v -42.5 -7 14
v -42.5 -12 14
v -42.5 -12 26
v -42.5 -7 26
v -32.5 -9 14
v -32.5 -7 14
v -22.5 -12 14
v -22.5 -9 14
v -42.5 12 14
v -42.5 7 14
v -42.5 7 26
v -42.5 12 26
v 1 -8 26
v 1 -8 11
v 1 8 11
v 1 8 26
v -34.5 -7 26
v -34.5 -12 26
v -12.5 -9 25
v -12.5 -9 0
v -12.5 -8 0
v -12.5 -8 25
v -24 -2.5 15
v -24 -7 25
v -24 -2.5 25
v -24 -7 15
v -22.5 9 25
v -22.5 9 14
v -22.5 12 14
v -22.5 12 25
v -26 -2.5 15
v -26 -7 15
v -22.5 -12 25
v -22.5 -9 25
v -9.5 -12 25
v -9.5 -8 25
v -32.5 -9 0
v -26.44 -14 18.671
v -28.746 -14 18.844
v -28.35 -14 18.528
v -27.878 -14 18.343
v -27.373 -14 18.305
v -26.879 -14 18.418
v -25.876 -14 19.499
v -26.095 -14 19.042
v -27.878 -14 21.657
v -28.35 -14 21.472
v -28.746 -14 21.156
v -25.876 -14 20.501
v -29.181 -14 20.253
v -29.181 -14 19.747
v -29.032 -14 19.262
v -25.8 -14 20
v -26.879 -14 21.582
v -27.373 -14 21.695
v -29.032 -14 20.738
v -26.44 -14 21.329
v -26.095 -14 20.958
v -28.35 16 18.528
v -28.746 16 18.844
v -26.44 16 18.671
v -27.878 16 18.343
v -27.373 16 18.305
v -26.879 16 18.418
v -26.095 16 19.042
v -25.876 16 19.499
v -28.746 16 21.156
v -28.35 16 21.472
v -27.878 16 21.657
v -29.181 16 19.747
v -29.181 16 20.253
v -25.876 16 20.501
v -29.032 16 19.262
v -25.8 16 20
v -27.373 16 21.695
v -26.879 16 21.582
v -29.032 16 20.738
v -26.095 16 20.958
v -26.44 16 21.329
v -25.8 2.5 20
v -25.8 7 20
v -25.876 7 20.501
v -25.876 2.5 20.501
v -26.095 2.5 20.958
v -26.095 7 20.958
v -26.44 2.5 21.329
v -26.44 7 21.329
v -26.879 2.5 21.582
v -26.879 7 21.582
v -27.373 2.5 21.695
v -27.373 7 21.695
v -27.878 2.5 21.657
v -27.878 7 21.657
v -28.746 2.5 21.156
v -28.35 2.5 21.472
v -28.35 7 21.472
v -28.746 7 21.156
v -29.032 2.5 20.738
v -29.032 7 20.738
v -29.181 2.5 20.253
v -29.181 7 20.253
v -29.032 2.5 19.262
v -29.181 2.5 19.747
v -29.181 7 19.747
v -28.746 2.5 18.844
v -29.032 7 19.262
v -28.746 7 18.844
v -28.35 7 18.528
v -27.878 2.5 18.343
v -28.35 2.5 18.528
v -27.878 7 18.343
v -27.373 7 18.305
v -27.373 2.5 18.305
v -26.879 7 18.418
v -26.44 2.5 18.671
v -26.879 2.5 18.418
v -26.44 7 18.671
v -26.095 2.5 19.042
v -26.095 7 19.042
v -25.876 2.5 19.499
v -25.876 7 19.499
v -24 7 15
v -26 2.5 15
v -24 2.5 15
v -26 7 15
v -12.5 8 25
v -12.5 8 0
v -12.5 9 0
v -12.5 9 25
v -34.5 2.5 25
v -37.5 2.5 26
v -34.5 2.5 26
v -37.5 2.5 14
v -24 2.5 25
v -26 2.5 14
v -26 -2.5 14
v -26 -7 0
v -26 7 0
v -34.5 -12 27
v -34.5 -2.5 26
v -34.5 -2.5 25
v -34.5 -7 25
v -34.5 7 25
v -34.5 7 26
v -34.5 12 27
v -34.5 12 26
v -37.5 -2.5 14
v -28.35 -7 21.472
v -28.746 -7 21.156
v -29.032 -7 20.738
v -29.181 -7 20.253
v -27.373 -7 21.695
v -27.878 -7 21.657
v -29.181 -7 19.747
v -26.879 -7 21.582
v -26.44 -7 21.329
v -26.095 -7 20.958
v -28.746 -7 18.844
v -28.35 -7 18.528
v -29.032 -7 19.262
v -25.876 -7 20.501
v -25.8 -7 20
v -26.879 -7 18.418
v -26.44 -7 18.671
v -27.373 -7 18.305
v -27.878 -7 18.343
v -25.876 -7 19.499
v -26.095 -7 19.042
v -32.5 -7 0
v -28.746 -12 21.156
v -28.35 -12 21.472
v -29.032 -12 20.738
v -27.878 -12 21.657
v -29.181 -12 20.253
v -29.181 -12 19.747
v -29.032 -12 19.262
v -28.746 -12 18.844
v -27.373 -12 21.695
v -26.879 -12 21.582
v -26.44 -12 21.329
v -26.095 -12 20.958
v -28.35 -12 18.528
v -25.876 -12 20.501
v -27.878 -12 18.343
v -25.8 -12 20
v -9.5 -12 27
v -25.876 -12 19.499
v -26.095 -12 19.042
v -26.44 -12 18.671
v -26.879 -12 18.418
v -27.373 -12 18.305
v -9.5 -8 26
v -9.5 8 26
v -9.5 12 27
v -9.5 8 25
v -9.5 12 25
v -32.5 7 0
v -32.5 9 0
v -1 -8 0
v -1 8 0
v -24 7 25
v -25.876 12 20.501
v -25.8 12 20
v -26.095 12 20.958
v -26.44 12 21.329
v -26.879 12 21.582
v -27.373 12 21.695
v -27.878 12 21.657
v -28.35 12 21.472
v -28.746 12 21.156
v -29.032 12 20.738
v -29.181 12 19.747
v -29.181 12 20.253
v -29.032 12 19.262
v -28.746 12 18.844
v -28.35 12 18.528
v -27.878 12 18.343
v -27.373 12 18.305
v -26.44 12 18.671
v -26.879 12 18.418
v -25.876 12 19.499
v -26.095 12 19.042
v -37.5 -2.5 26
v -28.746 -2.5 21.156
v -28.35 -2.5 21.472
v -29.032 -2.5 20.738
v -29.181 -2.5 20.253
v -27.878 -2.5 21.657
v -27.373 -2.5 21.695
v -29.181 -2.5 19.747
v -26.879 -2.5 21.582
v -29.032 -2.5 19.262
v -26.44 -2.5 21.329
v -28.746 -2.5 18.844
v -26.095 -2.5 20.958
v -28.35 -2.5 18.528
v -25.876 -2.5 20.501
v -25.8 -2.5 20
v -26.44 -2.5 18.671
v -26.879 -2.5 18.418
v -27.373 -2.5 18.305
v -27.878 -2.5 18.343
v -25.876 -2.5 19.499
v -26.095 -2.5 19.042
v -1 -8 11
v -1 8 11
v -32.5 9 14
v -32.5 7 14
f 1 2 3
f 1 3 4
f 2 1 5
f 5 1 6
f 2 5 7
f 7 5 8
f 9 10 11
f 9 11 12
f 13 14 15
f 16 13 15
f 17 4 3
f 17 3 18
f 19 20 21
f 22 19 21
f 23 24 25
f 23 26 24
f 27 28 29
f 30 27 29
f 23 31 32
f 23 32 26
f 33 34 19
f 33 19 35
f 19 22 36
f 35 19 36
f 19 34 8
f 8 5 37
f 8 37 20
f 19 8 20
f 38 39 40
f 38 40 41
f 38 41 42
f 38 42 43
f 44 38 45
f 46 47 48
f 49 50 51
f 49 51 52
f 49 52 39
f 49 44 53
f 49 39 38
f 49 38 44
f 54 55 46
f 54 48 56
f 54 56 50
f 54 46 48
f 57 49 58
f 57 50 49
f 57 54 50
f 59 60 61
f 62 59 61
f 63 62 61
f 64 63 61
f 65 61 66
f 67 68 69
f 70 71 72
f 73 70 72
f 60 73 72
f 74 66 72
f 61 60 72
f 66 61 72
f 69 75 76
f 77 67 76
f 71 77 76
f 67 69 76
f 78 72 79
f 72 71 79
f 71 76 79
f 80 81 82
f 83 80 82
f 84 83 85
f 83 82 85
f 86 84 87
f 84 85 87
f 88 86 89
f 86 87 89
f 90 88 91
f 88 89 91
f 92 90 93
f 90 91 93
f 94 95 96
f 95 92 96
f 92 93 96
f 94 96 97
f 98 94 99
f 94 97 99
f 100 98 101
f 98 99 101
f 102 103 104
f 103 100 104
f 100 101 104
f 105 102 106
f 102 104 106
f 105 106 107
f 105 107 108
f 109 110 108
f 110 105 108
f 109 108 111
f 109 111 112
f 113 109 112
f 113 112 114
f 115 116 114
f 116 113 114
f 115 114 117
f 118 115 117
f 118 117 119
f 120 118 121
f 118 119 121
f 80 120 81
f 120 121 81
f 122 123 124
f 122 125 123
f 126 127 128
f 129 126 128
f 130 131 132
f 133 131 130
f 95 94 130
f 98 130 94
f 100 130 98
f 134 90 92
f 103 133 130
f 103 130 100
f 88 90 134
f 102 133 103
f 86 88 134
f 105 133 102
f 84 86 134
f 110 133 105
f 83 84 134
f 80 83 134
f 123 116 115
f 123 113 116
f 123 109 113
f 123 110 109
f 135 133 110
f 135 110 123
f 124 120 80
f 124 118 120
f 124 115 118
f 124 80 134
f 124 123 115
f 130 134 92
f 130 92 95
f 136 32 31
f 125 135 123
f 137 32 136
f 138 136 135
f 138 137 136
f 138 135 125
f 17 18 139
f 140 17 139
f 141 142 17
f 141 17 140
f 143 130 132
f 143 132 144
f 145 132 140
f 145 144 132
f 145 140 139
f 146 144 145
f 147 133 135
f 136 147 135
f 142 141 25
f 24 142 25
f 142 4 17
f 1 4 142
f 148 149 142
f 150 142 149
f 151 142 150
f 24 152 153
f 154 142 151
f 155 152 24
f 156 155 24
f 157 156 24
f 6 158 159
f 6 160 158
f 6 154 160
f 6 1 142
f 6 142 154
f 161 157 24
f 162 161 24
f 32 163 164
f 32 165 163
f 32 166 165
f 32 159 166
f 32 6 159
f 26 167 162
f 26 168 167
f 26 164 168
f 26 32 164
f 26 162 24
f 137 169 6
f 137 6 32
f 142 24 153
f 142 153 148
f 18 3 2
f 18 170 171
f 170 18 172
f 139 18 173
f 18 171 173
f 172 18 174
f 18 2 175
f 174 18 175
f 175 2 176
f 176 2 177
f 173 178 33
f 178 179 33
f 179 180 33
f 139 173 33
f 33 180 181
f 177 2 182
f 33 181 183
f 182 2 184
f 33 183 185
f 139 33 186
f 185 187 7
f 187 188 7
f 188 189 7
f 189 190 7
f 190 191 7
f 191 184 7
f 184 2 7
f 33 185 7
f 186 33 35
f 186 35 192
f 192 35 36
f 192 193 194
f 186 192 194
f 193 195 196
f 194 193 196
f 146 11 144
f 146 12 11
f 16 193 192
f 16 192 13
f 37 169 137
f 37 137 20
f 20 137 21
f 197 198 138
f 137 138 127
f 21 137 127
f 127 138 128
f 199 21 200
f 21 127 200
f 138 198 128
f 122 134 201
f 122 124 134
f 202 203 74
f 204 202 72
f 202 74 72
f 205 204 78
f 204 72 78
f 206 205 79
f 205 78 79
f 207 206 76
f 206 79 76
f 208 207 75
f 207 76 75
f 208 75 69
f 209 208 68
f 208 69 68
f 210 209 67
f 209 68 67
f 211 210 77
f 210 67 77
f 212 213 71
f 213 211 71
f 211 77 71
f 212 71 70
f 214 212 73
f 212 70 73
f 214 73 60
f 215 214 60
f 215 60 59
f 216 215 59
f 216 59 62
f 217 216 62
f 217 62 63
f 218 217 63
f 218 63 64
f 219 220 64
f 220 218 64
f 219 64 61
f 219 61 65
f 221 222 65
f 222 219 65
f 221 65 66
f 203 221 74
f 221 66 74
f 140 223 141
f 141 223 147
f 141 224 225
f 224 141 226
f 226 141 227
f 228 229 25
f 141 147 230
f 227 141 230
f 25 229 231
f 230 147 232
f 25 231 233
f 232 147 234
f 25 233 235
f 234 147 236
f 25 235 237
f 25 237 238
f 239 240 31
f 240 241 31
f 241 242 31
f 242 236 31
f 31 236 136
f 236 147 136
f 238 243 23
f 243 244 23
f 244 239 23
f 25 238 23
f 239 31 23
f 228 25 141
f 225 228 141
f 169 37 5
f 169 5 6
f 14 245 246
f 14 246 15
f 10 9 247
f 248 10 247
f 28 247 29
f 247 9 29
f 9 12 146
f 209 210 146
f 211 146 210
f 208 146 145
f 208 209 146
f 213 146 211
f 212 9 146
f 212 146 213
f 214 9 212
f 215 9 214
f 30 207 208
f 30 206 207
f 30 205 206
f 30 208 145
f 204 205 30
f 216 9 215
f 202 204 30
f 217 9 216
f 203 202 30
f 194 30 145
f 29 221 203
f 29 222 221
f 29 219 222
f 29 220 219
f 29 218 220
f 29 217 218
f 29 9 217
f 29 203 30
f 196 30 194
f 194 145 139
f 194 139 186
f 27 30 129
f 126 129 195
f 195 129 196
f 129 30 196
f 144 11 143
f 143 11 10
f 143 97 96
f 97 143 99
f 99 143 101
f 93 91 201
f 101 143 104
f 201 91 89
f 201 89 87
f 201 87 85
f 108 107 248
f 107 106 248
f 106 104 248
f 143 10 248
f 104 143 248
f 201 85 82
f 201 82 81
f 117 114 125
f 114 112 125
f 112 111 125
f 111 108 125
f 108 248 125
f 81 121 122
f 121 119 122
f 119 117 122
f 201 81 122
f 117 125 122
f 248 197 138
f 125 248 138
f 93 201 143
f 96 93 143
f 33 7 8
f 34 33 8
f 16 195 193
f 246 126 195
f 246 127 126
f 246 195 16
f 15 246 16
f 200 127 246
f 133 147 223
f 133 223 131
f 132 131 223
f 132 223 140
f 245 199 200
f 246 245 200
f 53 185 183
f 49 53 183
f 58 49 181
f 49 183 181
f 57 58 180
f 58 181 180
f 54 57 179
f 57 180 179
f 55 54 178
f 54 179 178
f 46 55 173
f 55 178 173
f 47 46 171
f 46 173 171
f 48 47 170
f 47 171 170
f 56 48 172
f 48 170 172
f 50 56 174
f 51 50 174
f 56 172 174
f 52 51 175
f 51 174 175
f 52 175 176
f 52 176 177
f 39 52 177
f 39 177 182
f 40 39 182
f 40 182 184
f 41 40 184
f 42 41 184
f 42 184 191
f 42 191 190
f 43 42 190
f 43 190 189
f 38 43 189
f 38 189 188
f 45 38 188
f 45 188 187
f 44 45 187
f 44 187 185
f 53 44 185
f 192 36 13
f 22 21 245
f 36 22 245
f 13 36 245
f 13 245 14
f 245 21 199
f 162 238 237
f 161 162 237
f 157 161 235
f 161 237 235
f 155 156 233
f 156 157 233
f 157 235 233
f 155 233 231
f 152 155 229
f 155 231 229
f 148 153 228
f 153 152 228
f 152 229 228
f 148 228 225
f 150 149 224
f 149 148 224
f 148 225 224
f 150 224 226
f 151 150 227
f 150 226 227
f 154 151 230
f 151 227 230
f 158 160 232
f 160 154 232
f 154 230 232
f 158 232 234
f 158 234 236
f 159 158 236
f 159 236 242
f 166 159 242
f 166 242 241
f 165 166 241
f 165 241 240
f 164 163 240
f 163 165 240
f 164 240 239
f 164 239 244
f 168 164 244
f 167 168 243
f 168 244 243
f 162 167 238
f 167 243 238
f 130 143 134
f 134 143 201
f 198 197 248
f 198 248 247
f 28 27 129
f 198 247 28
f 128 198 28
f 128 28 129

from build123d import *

# Parameters (mm, degrees)
BOX050_W               = 25
BOX050_H               = 16
BOX050_DEPTH           = 15
BOX048_W               = 25
BOX048_H               = 24
BOX048_DEPTH           = 2
BOX043_W               = 20
BOX043_H               = 5
BOX043_DEPTH           = 12
CYLINDER020_R          = 1.7
CYLINDER020_DEPTH      = 30
CYLINDER020_ROLL_ANGLE = 90
BOX047_W               = 20
BOX047_H               = 2
BOX047_DEPTH           = 26
BOX046_W               = 20
BOX046_H               = 2
BOX046_DEPTH           = 26
BOX045_W               = 20
BOX045_H               = 5
BOX045_DEPTH           = 12
BOX044_W               = 20
BOX044_H               = 5
BOX044_DEPTH           = 12
BOX049_W               = 25
BOX049_H               = 16
BOX049_DEPTH           = 15


with BuildPart() as cube025:
    # Box050 → Box050 (new body)
    with BuildSketch(Plane(origin=(-24, -8, 11), x_dir=(1, 0, 0), z_dir=(0, 0, 1))):
        with Locations((12.5, 8)):
            Rectangle(BOX050_W, BOX050_H)
    extrude(amount=BOX050_DEPTH)


with BuildPart() as cube023:
    # Box048 → Box048 (new body)
    with BuildSketch(Plane(origin=(-34.5, -12, 25), x_dir=(1, 0, 0), z_dir=(0, 0, 1))):
        with Locations((12.5, 12)):
            Rectangle(BOX048_W, BOX048_H)
    extrude(amount=BOX048_DEPTH)


with BuildPart() as cube018:
    # Box043 → Box043 (new body)
    with BuildSketch(Plane(origin=(-37.5, -2.5, 14), x_dir=(1, 0, 0), z_dir=(0, 0, 1))):
        with Locations((10, 2.5)):
            Rectangle(BOX043_W, BOX043_H)
    extrude(amount=BOX043_DEPTH)


with BuildPart() as fusion009:
    # Cylinder020 → Cylinder020 (new body)
    with BuildSketch(Plane.XY):
        Circle(CYLINDER020_R)
    extrude(amount=CYLINDER020_DEPTH)


with BuildPart() as fusion009_1:
    # Cylinder020 roll: moved
    add(fusion009.part.rotate(Axis((0, 0, 0), (1, 0, 0)), CYLINDER020_ROLL_ANGLE))


with BuildPart() as fusion009_2:
    # Cylinder020 placement: moved
    add(fusion009_1.part.moved(Location((-27.5, 16, 20))))

    # Fusion009: union Cube018
    add(cube018.part)


with BuildPart() as fusion010:
    # Box047 → Box047 (new body)
    with BuildSketch(Plane(origin=(-32.5, 7, 0), x_dir=(1, 0, 0), z_dir=(0, 0, 1))):
        with Locations((10, 1)):
            Rectangle(BOX047_W, BOX047_H)
    extrude(amount=BOX047_DEPTH)

    # Fusion010: union Fusion009
    add(fusion009_2.part)


with BuildPart() as fusion011:
    # Box046 → Box046 (new body)
    with BuildSketch(Plane(origin=(-32.5, -9, 0), x_dir=(1, 0, 0), z_dir=(0, 0, 1))):
        with Locations((10, 1)):
            Rectangle(BOX046_W, BOX046_H)
    extrude(amount=BOX046_DEPTH)

    # Fusion011: union Fusion010
    add(fusion010.part)


with BuildPart() as fusion012:
    # Box045 → Box045 (new body)
    with BuildSketch(Plane(origin=(-42.5, 7, 14), x_dir=(1, 0, 0), z_dir=(0, 0, 1))):
        with Locations((10, 2.5)):
            Rectangle(BOX045_W, BOX045_H)
    extrude(amount=BOX045_DEPTH)

    # Fusion012: union Fusion011
    add(fusion011.part)


with BuildPart() as fusion014:
    # Box044 → Box044 (new body)
    with BuildSketch(Plane(origin=(-42.5, -12, 14), x_dir=(1, 0, 0), z_dir=(0, 0, 1))):
        with Locations((10, 2.5)):
            Rectangle(BOX044_W, BOX044_H)
    extrude(amount=BOX044_DEPTH)

    # Fusion013: union Fusion012
    add(fusion012.part)

    # Fusion014: union Cube023
    add(cube023.part)


with BuildPart() as fusion016:
    # Box049 → Box049 (new body)
    with BuildSketch(Plane(origin=(-26, -8, 0), x_dir=(1, 0, 0), z_dir=(0, 0, 1))):
        with Locations((12.5, 8)):
            Rectangle(BOX049_W, BOX049_H)
    extrude(amount=BOX049_DEPTH)

    # Fusion015: union Fusion014
    add(fusion014.part)

    # Fusion016: union Cube025
    add(cube025.part)


solid = fusion016.part
